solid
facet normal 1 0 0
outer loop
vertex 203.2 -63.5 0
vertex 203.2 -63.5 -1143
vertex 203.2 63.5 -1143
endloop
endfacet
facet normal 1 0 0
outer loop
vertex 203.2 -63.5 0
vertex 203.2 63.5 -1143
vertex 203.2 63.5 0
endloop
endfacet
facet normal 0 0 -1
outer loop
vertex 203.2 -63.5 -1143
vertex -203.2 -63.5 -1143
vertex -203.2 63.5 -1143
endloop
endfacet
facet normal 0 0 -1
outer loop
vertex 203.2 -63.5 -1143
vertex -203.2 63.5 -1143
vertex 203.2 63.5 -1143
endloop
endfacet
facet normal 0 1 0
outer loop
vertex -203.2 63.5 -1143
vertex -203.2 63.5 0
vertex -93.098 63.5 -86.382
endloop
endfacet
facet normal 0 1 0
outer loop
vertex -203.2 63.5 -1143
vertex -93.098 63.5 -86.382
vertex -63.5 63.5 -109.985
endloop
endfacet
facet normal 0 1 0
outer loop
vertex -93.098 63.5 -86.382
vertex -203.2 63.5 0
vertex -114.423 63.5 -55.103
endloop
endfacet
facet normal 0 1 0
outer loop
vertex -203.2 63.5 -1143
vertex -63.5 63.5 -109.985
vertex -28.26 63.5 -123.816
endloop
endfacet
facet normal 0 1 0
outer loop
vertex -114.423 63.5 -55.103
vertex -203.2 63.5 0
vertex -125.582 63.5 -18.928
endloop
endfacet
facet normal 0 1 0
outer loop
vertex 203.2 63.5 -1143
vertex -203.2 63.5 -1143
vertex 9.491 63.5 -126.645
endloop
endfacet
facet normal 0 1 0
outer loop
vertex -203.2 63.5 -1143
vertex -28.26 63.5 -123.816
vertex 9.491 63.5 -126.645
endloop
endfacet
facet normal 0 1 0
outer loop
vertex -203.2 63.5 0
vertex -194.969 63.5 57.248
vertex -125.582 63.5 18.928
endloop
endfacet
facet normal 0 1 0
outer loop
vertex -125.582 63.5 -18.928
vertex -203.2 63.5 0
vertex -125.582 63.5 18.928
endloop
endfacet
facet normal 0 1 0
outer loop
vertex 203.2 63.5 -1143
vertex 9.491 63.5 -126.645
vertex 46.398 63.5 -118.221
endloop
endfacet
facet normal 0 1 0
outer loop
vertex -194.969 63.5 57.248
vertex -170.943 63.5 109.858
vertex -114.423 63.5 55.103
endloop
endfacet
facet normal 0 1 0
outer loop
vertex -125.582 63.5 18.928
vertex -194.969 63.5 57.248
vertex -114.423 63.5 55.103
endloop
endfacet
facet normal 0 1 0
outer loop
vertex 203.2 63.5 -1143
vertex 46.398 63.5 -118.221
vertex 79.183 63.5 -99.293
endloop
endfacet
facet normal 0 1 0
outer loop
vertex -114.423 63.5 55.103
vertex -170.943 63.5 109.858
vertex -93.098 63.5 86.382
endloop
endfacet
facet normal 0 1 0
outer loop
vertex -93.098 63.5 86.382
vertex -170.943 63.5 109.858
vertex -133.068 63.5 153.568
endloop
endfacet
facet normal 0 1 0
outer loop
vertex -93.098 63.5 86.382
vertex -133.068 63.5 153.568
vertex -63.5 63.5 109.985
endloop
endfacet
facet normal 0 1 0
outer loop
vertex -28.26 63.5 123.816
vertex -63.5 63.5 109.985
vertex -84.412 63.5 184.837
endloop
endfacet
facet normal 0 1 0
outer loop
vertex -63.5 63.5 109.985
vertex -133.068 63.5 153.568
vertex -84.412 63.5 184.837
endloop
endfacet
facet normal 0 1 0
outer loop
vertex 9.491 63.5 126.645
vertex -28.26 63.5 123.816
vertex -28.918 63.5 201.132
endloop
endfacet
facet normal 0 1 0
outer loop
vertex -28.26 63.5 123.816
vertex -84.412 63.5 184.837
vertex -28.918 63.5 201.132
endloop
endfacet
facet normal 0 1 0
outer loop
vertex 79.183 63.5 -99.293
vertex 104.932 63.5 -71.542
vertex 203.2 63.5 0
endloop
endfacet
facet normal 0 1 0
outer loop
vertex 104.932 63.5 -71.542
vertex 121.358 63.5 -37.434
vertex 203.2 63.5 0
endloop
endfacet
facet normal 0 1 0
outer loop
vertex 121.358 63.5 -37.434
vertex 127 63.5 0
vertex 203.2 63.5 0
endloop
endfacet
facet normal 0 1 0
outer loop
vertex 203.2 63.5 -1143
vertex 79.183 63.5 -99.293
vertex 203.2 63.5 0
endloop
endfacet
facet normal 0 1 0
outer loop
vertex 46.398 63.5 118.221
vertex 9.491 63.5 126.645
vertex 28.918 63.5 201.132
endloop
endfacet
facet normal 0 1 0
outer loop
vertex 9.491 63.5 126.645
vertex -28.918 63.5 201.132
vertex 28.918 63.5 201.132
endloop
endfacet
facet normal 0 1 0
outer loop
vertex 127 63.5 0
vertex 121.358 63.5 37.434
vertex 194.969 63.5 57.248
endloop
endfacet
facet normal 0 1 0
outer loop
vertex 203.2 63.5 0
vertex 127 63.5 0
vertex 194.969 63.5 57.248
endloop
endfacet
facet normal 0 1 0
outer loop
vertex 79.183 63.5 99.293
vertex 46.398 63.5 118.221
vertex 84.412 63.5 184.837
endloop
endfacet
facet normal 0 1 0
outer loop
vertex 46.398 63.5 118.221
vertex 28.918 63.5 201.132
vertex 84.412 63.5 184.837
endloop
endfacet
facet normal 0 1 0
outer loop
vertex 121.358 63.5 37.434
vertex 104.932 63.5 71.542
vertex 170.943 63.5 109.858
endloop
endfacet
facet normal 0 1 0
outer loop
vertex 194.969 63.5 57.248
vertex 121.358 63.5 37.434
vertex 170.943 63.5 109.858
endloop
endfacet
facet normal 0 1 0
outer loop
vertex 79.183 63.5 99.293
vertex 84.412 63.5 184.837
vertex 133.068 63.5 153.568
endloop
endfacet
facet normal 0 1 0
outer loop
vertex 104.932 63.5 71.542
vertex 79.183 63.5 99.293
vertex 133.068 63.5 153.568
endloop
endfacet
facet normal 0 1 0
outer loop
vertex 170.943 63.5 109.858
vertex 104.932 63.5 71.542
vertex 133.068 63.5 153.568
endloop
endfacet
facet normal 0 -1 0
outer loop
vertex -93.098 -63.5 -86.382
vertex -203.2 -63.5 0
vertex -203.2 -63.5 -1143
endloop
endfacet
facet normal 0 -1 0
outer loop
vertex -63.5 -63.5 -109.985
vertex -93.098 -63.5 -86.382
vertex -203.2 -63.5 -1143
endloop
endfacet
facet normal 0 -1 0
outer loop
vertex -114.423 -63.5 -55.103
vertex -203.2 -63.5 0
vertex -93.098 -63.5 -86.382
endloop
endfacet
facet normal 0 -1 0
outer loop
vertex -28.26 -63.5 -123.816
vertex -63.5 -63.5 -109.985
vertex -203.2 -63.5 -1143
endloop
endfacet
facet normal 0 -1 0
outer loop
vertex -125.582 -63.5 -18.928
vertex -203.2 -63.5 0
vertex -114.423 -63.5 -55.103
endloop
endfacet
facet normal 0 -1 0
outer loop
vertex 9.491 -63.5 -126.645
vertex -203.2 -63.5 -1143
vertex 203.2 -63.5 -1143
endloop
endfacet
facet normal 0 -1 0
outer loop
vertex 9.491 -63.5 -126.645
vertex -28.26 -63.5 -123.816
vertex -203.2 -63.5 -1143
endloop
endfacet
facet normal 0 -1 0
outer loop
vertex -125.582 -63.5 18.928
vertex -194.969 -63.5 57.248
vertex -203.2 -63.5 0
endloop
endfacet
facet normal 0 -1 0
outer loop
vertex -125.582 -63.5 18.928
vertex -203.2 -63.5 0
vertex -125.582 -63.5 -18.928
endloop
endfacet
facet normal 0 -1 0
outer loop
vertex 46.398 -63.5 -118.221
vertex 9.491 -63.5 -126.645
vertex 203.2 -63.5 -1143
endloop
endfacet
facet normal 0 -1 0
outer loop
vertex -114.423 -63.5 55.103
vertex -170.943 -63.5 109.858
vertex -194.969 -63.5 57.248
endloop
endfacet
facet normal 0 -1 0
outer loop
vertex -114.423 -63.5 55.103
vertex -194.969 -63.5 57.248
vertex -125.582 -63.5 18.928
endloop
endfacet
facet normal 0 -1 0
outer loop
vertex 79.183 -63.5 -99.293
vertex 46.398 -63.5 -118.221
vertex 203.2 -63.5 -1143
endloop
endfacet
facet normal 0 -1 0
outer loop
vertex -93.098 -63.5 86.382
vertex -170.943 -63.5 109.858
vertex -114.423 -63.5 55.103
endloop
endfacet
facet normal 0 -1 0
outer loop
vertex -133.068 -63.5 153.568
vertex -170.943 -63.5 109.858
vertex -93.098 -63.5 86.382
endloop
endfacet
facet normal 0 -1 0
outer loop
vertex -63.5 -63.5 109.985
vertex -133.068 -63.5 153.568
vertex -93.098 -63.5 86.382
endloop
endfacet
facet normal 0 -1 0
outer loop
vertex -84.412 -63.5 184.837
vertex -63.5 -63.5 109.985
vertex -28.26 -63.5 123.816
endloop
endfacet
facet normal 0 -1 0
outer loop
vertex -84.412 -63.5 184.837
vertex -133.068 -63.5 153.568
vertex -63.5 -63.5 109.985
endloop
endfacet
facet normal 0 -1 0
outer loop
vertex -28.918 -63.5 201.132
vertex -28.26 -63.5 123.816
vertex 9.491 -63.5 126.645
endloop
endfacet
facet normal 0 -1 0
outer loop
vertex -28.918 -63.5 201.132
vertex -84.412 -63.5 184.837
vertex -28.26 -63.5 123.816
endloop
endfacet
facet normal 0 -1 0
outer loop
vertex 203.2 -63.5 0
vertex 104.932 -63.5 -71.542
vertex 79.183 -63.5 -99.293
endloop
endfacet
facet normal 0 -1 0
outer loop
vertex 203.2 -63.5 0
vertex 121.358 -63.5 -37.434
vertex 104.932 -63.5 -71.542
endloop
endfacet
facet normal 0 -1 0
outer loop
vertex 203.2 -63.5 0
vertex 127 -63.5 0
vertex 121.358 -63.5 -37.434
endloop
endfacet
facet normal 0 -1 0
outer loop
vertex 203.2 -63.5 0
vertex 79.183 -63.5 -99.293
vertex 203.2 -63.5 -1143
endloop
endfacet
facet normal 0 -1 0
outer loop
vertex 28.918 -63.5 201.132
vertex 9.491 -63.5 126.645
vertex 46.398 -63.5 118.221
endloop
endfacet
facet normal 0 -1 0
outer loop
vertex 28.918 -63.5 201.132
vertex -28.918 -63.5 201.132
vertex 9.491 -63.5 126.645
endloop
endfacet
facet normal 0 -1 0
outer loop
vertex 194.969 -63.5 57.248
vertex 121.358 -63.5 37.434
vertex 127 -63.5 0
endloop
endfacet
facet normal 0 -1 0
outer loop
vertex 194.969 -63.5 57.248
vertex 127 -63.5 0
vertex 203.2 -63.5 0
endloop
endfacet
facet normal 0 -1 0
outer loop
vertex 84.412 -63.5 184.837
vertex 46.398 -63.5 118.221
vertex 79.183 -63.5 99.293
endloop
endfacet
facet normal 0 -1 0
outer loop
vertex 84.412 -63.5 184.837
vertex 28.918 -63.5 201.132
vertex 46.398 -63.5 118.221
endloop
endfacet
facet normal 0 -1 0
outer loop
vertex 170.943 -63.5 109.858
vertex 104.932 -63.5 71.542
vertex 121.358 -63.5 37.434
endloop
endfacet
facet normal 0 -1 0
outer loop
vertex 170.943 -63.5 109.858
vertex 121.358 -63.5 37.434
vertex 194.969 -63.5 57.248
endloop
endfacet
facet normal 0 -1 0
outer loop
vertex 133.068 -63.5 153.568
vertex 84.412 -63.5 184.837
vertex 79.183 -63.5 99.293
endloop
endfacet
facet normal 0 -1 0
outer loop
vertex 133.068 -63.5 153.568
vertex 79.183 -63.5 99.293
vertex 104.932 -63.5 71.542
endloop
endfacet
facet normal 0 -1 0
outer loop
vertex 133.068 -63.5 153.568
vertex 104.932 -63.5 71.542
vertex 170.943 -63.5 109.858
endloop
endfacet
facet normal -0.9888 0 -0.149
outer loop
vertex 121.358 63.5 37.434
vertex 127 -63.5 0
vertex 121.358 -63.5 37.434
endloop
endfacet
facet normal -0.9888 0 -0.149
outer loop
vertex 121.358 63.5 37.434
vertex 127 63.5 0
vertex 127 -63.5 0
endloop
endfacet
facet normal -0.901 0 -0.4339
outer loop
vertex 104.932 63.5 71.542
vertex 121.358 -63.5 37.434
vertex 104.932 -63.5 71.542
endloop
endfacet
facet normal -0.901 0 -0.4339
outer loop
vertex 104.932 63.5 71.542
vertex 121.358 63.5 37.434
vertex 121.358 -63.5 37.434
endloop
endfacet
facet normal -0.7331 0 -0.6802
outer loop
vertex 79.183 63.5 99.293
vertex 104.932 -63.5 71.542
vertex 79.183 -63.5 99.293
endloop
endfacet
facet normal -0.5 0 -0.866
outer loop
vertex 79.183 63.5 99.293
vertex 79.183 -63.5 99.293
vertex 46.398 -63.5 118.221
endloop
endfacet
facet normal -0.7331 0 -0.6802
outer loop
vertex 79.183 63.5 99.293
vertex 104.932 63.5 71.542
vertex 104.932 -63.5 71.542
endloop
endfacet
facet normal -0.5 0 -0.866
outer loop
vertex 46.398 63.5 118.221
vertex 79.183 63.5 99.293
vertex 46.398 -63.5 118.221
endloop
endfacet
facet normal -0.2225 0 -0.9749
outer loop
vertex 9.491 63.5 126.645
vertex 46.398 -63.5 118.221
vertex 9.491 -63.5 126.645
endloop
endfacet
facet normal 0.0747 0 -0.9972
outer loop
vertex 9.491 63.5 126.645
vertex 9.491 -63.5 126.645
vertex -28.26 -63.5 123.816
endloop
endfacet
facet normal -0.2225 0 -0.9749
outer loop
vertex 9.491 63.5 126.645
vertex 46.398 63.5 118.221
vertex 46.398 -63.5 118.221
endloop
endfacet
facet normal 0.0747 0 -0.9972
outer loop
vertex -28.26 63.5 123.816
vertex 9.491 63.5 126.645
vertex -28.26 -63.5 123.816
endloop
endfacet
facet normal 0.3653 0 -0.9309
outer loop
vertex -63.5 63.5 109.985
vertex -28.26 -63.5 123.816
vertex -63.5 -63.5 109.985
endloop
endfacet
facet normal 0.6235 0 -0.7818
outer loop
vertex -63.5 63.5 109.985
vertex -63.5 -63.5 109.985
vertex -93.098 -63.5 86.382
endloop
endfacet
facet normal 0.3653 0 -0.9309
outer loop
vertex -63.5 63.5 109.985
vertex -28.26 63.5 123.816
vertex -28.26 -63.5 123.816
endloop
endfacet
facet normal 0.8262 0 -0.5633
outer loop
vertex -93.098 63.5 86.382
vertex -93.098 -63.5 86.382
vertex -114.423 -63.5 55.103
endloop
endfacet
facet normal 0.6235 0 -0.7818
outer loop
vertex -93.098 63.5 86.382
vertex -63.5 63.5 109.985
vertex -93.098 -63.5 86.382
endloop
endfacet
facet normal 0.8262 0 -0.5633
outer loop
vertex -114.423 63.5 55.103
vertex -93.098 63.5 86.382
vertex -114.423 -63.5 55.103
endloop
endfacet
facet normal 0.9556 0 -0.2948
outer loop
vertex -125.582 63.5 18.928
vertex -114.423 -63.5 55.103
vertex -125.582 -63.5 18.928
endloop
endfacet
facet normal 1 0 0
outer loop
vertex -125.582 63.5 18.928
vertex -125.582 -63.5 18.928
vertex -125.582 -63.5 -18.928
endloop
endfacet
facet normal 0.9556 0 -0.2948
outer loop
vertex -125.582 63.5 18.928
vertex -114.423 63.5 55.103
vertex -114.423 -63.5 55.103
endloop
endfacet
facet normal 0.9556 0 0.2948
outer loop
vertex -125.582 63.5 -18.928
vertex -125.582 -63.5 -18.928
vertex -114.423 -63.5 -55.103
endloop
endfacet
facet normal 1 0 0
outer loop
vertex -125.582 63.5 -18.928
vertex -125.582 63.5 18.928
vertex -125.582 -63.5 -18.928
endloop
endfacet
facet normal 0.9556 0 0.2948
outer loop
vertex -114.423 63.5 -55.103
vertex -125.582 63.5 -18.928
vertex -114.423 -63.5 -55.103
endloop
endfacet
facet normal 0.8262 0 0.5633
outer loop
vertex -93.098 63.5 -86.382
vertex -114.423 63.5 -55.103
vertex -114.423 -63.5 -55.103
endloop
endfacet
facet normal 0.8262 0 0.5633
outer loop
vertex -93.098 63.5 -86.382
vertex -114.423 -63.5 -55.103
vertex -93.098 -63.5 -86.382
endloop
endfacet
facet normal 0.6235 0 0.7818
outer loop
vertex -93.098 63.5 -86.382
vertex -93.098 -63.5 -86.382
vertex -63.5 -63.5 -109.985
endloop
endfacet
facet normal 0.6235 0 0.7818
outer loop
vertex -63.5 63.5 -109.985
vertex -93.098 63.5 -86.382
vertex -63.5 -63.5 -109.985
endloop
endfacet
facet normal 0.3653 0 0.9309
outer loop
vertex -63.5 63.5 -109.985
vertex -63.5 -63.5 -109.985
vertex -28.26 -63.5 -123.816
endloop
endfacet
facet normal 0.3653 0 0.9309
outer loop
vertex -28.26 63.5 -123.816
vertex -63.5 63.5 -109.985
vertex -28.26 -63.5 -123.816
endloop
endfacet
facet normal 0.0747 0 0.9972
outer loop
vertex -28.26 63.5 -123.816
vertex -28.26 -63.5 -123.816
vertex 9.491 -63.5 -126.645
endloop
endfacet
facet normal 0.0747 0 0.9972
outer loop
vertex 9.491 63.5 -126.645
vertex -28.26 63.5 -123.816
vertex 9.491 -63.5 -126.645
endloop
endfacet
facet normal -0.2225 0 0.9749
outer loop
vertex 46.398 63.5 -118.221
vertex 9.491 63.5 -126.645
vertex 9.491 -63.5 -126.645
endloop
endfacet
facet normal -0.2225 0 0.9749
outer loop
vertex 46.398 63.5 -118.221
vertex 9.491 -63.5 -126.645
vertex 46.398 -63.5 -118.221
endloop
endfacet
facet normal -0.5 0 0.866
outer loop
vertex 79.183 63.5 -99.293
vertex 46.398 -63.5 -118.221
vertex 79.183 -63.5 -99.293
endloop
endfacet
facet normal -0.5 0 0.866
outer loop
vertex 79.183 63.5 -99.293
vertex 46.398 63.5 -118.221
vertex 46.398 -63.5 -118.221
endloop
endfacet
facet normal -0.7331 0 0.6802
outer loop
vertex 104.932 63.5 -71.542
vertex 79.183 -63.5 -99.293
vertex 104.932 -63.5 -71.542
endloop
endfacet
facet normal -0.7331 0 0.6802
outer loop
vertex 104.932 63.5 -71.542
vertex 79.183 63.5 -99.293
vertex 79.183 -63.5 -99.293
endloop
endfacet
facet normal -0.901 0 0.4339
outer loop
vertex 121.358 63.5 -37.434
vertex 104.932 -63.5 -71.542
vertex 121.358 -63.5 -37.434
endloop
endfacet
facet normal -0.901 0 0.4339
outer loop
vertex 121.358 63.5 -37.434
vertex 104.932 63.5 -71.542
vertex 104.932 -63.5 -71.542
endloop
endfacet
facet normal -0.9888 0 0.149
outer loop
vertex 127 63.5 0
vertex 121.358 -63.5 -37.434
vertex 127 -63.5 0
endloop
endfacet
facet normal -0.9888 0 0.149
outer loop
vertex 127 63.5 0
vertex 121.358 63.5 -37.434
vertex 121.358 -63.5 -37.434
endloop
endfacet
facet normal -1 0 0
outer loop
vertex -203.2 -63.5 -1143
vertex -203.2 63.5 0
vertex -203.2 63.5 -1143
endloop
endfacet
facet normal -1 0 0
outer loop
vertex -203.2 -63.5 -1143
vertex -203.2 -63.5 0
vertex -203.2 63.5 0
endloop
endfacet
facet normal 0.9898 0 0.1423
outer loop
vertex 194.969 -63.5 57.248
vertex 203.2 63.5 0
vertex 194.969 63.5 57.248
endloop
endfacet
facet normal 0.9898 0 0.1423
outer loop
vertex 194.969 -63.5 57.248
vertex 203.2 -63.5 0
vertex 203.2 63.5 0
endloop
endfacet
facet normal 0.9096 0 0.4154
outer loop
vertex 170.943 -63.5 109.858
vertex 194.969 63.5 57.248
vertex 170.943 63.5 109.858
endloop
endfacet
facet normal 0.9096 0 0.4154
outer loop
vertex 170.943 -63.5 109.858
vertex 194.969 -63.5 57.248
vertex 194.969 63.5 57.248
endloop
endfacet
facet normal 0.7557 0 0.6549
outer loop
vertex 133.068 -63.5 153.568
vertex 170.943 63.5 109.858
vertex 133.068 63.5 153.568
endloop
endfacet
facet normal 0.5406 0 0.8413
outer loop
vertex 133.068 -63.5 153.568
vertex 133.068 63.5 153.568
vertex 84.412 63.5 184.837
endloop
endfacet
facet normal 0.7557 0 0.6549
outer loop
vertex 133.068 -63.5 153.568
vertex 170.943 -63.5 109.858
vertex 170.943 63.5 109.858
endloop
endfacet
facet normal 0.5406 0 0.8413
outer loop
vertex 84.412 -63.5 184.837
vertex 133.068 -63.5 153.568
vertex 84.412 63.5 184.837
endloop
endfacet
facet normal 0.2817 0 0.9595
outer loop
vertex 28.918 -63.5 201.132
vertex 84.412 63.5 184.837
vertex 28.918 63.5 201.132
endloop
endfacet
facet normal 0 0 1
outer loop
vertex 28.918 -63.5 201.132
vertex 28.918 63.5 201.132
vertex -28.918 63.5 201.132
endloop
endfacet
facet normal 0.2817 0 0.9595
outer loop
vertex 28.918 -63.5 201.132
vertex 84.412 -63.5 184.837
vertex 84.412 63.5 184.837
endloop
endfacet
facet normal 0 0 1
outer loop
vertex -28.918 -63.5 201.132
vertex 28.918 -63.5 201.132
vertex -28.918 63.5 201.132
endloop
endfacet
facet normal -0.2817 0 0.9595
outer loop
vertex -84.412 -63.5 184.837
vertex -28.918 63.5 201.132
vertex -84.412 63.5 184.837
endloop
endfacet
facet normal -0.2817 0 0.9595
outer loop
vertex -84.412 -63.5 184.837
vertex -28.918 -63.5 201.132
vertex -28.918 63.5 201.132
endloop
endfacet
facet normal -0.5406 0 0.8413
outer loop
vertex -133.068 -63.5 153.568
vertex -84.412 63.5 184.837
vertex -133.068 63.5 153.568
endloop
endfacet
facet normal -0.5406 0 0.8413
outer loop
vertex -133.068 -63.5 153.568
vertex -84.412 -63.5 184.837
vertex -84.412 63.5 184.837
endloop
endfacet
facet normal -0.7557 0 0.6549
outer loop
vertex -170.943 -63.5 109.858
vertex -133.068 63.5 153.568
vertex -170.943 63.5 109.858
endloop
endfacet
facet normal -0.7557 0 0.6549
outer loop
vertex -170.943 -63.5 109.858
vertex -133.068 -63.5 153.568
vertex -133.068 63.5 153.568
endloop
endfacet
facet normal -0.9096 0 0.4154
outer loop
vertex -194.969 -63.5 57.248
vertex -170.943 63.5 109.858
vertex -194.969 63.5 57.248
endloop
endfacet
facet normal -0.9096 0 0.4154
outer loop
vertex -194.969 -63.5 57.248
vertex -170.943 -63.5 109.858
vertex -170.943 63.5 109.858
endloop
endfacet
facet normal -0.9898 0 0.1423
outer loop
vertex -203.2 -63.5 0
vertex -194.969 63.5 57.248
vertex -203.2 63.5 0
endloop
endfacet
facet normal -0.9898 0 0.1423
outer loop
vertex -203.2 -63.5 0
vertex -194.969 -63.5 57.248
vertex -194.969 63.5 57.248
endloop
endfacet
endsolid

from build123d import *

# Parameters (mm, degrees)
F0_R     = 127
F1_DEPTH = 63.5


with BuildPart() as f1:
    # F0 (on Front) → F1 (new body, symmetric)
    with BuildSketch(Plane.XZ):
        with BuildLine():
            Line((-203.2, 0), (-203.2, -1143))
            Line((-203.2, -1143), (203.2, -1143))
            Line((203.2, -1143), (203.2, 0))
            ThreePointArc((203.2, 0), (0, 203.2), (-203.2, 0))
        make_face()
        Circle(F0_R, mode=Mode.SUBTRACT)
    extrude(amount=F1_DEPTH, both=True)


solid = f1.part
